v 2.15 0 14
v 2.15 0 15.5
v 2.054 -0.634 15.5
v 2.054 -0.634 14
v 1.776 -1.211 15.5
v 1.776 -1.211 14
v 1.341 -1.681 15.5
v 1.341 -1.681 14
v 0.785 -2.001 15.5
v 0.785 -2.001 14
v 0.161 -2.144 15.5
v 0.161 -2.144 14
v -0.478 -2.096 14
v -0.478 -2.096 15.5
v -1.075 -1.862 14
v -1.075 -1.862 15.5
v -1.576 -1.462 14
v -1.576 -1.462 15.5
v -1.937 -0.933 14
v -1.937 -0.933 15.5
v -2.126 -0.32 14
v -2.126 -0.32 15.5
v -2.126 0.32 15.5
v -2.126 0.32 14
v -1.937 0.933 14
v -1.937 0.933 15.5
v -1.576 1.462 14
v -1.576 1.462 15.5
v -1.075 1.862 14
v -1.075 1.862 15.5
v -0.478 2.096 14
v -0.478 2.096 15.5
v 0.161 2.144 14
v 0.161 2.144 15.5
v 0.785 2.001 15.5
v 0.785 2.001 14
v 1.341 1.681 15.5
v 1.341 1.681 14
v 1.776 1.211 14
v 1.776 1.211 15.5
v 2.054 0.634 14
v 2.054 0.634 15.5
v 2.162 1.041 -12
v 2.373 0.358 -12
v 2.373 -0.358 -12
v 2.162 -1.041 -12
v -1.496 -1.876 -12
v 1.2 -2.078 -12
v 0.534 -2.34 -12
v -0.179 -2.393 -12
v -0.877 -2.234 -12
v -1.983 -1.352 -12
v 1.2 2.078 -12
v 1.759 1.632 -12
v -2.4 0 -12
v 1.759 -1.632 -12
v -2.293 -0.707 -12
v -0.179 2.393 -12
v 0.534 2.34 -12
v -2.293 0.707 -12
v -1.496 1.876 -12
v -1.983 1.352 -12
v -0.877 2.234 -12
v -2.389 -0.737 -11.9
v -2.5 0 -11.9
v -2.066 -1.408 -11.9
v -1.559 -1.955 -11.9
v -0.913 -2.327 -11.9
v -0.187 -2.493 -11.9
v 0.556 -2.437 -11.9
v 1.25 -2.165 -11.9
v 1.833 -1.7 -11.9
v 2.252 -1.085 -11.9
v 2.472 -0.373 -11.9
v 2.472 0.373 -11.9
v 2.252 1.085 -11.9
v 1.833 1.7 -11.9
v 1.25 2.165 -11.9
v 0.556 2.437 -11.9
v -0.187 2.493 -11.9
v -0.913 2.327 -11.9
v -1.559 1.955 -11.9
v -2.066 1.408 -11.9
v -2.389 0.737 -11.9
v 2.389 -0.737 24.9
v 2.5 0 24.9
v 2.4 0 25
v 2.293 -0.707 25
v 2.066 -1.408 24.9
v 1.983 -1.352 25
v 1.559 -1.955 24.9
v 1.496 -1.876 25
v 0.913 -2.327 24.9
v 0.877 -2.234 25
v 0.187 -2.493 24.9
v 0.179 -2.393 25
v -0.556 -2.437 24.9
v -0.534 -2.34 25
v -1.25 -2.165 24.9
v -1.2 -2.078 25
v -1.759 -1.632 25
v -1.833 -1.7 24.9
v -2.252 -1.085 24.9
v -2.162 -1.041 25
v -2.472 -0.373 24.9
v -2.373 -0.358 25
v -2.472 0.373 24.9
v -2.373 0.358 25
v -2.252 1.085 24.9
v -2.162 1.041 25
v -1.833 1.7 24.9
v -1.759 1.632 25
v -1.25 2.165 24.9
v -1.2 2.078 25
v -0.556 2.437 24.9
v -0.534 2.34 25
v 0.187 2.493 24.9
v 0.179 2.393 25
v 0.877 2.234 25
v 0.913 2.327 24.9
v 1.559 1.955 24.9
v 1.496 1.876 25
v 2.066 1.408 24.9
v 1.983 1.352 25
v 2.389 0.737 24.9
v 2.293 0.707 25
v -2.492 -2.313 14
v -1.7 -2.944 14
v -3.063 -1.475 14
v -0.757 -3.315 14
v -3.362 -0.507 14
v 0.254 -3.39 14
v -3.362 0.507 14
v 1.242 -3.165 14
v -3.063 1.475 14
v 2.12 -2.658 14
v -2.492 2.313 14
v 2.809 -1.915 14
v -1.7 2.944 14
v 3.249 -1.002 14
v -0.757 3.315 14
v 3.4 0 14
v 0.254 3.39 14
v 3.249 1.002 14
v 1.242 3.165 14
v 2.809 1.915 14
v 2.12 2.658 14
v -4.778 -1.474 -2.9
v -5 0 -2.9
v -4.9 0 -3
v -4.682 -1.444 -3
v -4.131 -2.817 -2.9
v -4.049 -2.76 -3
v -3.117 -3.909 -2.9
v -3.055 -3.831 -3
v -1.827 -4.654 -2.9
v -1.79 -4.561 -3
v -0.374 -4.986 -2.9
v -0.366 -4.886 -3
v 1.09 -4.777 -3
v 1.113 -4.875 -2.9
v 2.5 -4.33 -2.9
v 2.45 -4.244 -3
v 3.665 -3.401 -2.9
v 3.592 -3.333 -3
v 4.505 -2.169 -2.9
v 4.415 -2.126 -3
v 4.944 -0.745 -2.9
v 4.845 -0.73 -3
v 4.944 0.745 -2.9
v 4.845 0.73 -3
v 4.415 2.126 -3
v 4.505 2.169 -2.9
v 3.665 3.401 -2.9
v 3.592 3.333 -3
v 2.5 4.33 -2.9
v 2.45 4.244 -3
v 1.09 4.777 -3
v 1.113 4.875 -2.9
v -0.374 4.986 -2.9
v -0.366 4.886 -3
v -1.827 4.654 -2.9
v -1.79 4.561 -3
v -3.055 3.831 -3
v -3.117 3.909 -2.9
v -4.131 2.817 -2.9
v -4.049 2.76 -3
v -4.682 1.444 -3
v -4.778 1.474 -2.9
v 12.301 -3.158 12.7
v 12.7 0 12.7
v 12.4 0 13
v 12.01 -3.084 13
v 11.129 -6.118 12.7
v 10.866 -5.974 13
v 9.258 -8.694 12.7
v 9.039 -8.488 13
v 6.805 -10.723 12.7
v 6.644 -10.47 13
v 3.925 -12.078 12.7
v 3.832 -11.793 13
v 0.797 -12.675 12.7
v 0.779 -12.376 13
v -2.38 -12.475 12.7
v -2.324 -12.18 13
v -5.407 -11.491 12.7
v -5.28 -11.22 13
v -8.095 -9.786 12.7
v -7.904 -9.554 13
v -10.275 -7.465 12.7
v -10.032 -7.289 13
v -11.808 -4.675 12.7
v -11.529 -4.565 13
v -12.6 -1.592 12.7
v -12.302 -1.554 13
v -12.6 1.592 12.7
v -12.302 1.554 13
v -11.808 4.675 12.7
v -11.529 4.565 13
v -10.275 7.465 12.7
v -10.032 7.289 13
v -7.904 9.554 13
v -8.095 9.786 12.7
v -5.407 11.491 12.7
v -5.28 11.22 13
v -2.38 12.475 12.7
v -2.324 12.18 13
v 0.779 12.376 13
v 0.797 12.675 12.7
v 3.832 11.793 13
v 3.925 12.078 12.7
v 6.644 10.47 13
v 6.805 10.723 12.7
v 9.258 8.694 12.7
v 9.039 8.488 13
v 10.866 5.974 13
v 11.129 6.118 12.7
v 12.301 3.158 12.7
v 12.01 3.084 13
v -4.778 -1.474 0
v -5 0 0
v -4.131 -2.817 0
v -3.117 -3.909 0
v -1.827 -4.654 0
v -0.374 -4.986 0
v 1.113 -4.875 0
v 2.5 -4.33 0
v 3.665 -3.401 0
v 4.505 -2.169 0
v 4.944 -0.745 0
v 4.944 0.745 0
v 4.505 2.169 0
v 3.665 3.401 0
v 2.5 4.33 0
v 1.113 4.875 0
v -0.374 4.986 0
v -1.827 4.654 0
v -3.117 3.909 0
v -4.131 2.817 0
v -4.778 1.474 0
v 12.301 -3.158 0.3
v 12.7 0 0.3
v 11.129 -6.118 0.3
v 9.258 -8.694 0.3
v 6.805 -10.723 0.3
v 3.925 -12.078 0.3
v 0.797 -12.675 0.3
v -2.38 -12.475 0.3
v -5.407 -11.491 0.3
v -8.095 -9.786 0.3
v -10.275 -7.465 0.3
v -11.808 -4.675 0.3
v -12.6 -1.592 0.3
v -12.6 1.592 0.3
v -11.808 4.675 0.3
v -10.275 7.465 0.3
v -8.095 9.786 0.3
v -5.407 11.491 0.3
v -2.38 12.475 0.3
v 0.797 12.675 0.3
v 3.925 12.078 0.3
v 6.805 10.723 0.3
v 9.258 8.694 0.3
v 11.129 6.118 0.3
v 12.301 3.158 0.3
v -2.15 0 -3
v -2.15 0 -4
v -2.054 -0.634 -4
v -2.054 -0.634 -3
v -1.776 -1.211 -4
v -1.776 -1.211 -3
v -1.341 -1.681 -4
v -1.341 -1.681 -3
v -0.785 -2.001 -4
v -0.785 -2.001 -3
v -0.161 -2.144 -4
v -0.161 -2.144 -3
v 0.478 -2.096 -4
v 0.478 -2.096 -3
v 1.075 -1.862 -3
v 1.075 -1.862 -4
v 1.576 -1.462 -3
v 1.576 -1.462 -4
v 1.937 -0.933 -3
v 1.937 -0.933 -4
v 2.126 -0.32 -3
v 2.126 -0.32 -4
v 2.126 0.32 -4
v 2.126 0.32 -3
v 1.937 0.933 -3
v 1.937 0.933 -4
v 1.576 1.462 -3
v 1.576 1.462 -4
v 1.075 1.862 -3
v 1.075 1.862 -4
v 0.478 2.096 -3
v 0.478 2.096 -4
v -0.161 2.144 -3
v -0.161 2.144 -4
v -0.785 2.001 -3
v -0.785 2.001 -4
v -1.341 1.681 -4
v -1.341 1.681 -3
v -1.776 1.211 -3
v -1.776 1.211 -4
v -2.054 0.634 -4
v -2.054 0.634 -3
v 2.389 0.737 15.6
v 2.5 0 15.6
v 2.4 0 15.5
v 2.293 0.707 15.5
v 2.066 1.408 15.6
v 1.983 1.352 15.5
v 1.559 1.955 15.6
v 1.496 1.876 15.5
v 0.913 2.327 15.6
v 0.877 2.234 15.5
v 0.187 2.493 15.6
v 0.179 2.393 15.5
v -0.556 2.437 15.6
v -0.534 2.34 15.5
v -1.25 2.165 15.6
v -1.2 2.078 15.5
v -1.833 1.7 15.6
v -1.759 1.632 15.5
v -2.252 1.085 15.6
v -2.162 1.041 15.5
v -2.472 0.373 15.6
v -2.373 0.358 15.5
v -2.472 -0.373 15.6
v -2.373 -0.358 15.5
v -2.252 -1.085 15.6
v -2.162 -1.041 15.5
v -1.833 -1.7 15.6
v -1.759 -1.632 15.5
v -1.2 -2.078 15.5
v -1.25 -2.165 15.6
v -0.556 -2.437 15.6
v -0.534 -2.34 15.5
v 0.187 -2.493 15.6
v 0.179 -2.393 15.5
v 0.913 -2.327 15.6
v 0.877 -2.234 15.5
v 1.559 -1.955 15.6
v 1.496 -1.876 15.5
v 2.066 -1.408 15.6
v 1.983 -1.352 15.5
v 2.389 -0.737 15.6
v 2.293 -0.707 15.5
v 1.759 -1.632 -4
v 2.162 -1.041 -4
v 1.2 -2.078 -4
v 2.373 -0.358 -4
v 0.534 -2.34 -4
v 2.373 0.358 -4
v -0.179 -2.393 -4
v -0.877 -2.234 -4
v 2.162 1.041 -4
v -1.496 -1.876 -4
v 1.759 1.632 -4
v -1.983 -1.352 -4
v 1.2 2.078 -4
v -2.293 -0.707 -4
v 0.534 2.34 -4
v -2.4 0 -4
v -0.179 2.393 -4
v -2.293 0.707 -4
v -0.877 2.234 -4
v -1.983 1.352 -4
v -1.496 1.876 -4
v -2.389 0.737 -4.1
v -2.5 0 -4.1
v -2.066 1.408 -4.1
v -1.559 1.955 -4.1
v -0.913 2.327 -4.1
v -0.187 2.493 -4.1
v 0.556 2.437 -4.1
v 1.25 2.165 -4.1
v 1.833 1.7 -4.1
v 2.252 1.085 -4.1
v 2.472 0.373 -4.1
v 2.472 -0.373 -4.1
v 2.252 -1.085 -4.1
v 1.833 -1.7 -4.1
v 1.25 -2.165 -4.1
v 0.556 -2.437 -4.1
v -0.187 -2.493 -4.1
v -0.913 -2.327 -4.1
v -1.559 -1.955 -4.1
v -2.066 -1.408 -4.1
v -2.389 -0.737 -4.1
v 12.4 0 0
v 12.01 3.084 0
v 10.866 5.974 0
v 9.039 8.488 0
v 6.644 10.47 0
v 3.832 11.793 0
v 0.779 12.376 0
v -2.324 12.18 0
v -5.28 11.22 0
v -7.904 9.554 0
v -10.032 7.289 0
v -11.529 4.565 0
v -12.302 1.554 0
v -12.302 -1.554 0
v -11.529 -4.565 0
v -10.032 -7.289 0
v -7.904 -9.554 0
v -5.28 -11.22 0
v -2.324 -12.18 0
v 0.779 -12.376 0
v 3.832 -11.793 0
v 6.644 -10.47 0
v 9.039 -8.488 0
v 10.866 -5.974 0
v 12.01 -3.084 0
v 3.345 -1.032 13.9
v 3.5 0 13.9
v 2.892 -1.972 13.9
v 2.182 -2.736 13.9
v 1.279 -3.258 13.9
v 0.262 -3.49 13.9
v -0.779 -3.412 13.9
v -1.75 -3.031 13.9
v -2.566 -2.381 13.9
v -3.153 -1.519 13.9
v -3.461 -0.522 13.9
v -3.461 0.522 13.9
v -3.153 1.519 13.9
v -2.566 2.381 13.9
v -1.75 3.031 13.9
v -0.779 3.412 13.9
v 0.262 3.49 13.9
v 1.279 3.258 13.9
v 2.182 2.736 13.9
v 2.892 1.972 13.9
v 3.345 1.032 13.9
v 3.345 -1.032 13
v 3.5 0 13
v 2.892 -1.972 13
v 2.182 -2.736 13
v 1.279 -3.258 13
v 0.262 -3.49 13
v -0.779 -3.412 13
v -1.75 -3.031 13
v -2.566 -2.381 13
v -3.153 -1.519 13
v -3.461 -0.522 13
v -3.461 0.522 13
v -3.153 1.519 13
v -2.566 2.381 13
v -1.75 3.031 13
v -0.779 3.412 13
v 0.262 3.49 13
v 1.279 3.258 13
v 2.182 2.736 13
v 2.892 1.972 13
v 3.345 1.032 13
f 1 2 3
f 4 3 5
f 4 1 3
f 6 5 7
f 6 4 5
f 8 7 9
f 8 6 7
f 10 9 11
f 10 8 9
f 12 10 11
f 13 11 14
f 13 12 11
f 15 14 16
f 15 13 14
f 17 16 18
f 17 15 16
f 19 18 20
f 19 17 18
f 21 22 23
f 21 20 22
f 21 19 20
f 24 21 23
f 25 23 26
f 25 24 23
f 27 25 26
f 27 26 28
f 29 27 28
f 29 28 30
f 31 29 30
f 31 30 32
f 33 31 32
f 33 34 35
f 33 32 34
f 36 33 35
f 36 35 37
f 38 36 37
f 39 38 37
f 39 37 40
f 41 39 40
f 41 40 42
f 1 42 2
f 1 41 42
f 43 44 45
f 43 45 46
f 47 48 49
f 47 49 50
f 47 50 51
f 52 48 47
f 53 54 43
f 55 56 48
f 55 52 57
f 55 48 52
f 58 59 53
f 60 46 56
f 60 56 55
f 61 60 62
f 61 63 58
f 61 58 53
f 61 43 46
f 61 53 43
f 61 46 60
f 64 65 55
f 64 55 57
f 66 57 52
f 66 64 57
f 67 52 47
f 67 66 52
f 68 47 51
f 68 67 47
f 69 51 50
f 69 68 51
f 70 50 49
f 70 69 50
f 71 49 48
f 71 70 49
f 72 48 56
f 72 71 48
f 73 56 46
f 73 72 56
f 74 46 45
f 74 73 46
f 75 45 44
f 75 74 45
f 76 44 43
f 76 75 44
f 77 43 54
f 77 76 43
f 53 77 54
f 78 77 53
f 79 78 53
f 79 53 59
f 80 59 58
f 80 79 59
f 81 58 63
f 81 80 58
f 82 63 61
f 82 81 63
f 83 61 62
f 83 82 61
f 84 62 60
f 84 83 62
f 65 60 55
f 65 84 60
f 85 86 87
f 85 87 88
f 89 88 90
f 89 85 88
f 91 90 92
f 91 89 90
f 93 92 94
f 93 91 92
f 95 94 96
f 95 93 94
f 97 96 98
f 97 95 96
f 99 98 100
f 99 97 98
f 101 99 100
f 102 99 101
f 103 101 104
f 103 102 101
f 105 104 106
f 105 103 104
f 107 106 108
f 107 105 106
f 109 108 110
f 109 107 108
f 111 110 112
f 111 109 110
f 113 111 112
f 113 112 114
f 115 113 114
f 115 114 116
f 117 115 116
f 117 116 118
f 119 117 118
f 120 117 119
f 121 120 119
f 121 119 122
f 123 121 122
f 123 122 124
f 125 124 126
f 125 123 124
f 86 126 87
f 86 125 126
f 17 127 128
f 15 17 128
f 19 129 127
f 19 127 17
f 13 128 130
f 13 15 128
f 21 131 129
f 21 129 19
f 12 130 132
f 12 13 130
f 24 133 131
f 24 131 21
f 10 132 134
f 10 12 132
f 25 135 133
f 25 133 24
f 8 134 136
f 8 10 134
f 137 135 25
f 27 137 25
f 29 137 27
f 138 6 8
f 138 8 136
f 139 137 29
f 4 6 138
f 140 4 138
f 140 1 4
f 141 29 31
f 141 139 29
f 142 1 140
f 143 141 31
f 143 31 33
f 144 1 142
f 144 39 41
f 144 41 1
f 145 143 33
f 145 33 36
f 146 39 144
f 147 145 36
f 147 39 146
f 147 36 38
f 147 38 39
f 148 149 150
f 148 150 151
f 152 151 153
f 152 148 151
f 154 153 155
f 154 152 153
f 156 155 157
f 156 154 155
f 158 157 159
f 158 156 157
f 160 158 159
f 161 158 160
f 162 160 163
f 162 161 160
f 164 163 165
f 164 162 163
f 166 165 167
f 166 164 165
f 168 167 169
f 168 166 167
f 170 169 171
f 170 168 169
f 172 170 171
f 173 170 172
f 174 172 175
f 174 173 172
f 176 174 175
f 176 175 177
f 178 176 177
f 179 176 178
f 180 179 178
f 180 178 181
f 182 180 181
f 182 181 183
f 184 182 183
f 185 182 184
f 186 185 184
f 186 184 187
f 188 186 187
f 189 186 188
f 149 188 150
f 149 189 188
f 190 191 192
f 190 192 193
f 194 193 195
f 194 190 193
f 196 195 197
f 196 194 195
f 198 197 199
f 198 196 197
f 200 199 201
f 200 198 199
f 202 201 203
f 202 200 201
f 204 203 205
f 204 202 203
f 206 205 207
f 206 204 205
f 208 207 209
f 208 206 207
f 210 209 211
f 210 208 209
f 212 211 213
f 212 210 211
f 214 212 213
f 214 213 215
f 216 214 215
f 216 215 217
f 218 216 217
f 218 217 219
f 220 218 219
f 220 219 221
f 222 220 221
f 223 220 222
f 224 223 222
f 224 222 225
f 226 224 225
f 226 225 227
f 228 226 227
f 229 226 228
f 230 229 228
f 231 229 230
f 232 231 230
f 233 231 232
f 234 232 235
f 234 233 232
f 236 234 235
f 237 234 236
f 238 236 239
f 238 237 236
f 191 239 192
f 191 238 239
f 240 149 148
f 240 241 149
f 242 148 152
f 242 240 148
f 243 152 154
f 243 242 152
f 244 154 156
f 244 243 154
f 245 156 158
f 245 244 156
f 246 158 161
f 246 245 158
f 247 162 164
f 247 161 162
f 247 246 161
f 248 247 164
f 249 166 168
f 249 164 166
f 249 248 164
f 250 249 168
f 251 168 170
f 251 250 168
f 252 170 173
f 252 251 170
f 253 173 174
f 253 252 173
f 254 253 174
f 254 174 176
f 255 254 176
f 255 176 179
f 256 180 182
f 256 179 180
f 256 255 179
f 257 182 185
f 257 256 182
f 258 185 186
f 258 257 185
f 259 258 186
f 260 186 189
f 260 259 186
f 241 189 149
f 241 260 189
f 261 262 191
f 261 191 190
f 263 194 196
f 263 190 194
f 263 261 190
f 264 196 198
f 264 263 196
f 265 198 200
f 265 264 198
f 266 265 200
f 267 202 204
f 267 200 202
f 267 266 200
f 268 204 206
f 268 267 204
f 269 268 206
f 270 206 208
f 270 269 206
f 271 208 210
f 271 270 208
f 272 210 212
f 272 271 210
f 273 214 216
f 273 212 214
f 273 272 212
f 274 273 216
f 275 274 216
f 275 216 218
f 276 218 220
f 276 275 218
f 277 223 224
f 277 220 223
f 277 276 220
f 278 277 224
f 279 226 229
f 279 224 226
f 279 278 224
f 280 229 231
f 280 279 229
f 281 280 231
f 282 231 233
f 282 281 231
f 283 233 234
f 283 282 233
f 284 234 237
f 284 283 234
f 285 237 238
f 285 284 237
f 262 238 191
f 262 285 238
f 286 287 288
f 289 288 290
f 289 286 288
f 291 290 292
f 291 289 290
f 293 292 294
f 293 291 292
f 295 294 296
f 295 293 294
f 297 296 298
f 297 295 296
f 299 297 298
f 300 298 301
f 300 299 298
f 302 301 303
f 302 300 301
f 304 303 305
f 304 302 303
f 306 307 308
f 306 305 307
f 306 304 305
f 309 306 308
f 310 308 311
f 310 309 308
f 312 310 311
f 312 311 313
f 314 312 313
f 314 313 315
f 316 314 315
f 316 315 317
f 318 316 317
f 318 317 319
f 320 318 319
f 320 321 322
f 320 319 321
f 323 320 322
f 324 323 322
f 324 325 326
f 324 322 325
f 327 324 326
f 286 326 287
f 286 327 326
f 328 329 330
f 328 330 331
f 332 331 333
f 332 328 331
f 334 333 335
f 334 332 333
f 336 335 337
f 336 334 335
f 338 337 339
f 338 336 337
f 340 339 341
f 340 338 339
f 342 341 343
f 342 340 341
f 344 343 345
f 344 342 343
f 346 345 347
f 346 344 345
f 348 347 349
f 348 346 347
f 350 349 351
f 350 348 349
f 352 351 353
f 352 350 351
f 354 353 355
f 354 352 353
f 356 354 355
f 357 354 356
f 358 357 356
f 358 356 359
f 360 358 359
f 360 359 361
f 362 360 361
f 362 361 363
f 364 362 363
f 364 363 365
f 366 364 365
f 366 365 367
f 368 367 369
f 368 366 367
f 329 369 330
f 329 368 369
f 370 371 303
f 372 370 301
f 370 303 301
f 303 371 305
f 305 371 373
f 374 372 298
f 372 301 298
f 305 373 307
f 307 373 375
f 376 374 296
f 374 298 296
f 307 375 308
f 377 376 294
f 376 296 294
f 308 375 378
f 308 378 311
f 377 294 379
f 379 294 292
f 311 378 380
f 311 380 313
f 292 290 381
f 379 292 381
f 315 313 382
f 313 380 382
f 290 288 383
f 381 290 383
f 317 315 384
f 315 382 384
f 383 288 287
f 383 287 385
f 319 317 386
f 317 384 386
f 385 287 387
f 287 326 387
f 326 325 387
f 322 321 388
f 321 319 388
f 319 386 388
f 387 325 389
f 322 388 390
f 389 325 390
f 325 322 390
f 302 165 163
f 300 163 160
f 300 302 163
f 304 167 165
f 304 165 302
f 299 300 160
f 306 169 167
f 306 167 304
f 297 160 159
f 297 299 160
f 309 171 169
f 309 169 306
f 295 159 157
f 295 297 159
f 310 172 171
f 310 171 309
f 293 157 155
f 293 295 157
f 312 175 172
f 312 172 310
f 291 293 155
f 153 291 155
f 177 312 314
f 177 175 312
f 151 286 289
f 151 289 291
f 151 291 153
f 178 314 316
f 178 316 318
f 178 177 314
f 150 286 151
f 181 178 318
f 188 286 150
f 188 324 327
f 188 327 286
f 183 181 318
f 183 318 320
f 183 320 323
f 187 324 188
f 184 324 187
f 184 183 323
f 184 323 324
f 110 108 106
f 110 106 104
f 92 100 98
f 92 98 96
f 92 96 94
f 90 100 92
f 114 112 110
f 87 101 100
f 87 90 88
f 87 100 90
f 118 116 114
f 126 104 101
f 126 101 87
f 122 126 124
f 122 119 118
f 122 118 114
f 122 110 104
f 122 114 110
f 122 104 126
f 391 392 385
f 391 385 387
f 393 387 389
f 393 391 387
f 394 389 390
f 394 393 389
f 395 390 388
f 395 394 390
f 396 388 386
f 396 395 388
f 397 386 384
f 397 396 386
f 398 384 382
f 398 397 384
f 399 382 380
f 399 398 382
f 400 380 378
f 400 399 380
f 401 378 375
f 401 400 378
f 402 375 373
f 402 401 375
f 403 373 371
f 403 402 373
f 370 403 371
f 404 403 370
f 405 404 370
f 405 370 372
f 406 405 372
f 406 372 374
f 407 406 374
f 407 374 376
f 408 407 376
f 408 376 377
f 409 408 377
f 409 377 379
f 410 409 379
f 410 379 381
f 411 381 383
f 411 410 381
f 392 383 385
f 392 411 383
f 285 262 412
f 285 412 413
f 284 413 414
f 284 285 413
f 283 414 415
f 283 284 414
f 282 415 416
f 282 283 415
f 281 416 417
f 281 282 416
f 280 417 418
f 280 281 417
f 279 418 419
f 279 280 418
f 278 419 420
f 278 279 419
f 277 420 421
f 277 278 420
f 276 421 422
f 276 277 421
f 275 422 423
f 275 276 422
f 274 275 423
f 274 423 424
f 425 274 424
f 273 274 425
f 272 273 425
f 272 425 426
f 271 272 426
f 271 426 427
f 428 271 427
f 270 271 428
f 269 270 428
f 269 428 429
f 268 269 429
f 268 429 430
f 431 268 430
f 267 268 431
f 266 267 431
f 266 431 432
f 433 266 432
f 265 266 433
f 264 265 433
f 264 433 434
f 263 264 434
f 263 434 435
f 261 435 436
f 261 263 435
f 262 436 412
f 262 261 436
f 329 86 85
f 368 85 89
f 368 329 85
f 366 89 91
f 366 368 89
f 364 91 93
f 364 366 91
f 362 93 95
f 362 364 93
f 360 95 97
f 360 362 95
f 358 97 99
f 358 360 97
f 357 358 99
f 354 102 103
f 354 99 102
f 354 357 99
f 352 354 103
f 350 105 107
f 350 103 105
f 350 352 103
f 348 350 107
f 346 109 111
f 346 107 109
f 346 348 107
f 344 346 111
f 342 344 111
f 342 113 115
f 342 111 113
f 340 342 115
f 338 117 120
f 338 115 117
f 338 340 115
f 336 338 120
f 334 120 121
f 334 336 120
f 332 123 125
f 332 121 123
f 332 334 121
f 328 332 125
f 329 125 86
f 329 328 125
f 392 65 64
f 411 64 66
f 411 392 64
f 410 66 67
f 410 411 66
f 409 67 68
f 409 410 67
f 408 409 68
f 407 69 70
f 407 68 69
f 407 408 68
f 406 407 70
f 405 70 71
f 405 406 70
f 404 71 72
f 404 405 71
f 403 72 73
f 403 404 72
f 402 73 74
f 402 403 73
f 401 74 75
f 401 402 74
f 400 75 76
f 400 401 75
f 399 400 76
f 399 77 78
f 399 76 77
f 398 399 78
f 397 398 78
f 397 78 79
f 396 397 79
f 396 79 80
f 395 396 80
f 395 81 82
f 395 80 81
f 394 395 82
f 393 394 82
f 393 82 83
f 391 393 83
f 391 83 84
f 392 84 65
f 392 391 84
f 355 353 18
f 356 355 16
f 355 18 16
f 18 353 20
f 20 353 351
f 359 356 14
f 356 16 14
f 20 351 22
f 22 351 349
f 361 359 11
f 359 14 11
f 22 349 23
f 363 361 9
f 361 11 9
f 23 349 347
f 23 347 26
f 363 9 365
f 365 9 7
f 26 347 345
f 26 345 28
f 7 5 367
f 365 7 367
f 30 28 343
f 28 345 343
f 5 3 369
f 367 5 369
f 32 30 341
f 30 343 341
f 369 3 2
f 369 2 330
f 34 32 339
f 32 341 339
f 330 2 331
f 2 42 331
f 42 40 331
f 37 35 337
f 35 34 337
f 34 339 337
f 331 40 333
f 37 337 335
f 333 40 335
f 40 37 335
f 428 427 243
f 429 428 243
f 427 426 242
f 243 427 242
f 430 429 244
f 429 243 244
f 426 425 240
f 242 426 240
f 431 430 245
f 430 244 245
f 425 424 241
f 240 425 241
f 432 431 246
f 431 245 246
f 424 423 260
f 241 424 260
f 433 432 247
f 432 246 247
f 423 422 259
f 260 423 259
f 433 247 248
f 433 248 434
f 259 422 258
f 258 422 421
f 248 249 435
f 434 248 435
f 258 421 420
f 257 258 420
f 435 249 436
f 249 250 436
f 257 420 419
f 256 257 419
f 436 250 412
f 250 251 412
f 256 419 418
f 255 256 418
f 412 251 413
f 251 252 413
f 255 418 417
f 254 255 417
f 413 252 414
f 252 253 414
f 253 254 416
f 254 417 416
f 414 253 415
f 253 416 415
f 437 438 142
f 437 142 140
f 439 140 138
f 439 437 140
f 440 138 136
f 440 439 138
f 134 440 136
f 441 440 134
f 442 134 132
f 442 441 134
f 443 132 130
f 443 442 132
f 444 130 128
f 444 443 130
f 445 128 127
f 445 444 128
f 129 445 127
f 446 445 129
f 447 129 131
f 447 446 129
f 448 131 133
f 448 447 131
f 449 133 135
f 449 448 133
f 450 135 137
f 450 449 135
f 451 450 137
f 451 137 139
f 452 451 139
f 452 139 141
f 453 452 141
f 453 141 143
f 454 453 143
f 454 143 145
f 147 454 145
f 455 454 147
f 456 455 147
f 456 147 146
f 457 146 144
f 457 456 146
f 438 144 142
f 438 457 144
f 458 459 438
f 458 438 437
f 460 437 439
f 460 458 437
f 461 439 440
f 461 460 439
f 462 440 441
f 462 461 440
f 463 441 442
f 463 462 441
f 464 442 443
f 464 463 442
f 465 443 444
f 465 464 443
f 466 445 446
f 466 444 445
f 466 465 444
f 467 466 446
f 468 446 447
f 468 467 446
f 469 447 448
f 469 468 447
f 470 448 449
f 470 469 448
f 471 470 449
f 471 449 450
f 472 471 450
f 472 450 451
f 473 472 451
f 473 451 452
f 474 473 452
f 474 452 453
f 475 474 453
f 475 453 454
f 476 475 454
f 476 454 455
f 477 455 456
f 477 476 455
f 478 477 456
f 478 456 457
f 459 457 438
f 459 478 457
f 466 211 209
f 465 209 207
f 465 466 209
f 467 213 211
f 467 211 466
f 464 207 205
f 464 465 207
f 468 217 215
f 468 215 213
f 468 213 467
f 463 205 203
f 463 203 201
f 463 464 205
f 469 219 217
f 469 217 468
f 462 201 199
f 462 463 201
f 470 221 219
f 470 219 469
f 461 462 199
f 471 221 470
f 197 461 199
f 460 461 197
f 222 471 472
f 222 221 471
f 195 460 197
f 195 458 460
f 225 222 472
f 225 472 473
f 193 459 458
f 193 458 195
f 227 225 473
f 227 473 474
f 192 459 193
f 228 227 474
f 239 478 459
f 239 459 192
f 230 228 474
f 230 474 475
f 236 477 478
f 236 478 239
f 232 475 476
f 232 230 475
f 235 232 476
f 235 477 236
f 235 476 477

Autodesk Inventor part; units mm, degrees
ref_plane "YZ Plane" through (0, 0, 0) normal (1, 0, 0) x (0, 1, 0)
ref_plane "XZ Plane" through (0, 0, 0) normal (0, 1, 0) x (-1, 0, 0)
ref_plane "XY Plane" through (0, 0, 0) normal (0, 0, 1) x (1, 0, 0)
sketch "Sketch1" plane through (0, 0, 0) normal (0, 0, 1) x (1, 0, 0)
  circle A0 centre (0, 0) radius 12.7
  dimension "d0" = 25.4
extrude "Extrusion1" add sketch "Sketch1" along normal blind 13
sketch "Sketch2" plane through (0, 0, 13) normal (0, 0, 1) x (1, 0, 0)
  circle A0 centre (0, 0) radius 2.5
  dimension "d3" = 5
extrude "Extrusion2" add sketch "Sketch2" along normal blind 12
sketch "Sketch3" plane through (0, 0, 0) normal (0, 0, -1) x (-1, 0, 0)
  circle A0 centre (0, 0) radius 2.5
  dimension "d6" = 5
extrude "Extrusion3" add sketch "Sketch3" along normal blind 12
sketch "Sketch4" plane through (0, 0, 13) normal (0, 0, 1) x (1, 0, 0)
  circle A0 centre (0, 0) radius 2.15
  circle A1 centre (0, 0) radius 3.5
  dimension "d9" = 4.3
  dimension "d10" = 7
extrude "Extrusion4" cut sketch "Sketch4" along normal blind 2.5
sketch "Sketch5" plane through (0, 0, 0) normal (0, 0, -1) x (-1, 0, 0)
  circle A0 centre (0, 0) radius 3
  circle A1 centre (0, 0) radius 2.15
  dimension "d13" = 6
  dimension "d14" = 4.3
extrude "Extrusion5" cut sketch "Sketch5" along normal blind 4
sketch "Sketch6" plane through (0, 0, 13) normal (0, 0, 1) x (1, 0, 0)
  circle A0 centre (0, 0) radius 3.5
  dimension "d17" = 7
extrude "Extrusion6" add sketch "Sketch6" along normal blind 1
sketch "Sketch7" plane through (0, 0, 0) normal (0, 0, -1) x (-1, 0, 0)
  circle A0 centre (0, 0) radius 5
  dimension "d20" = 10
extrude "Extrusion7" add sketch "Sketch7" along normal blind 3
chamfer "Chamfer1" distance 0.1 angle 45 6 edges at (-2.5, 0, 25) (-2.5, 0, 15.5) (-3.5, 0, 14) (2.5, 0, -12) (2.5, 0, -4) (5, 0, -3)
chamfer "Chamfer2" distance 0.3 angle 45 2 edges at (-12.7, 0, 13) (-12.7, 0, 0)
thread "Thread1" size "M5x0.8" class "6g" standard "ANSI Metric M Profile" full length
thread "Thread2" size "M5x0.8" class "6g" standard "ANSI Metric M Profile" full length
properties part number "Force_Sensor"
